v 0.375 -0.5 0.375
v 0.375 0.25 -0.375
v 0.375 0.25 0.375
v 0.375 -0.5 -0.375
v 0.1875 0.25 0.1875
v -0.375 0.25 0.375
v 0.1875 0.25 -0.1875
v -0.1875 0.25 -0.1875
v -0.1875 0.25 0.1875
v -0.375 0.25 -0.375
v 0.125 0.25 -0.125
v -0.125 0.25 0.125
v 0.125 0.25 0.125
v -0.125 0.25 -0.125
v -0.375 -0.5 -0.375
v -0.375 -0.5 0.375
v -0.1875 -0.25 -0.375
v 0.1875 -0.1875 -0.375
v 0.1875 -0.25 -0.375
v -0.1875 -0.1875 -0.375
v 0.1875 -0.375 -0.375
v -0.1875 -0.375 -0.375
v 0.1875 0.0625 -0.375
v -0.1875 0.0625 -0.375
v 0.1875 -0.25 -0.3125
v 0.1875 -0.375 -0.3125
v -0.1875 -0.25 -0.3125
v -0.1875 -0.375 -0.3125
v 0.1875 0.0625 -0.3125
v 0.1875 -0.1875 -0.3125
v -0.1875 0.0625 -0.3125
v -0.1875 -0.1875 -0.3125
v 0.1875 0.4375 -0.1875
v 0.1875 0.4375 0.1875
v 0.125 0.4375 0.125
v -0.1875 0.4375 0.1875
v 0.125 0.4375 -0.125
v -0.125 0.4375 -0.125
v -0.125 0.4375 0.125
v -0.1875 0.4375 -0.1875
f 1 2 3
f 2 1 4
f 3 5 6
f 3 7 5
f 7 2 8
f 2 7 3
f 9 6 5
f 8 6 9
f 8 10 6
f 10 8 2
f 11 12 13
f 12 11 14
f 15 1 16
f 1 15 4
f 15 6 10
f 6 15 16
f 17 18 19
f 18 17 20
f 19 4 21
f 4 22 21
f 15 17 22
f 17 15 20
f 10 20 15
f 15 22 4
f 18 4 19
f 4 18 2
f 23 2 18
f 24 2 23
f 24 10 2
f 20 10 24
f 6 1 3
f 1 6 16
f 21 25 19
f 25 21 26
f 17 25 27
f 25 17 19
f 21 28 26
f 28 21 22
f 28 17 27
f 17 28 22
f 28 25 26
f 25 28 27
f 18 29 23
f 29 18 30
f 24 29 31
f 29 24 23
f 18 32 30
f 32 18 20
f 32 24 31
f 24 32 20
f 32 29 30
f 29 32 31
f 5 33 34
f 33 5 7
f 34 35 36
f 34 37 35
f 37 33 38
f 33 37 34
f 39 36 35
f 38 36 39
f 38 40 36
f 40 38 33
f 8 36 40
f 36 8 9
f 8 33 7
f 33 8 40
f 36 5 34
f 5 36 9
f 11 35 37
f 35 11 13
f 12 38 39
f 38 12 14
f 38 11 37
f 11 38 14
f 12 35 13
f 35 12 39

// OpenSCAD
rotate(-90, [1, 0, 0]) {
    translate([0, 0, -2/16])
    difference() {
        cube([12/16, 12/16, 12/16], center = true);
        translate([0, 6/16, -3/16])
        cube([6/16, 2/16, 2/16], center = true);
        translate([0, 6/16, 1/16])
        cube([6/16, 2/16, 4/16], center = true);
    }
    translate([0, 0, 5/16])
    difference() {
        cube([6/16, 6/16, 4/16], center = true);
        cube([4/16, 4/16, 5/16], center = true);
    }
}
